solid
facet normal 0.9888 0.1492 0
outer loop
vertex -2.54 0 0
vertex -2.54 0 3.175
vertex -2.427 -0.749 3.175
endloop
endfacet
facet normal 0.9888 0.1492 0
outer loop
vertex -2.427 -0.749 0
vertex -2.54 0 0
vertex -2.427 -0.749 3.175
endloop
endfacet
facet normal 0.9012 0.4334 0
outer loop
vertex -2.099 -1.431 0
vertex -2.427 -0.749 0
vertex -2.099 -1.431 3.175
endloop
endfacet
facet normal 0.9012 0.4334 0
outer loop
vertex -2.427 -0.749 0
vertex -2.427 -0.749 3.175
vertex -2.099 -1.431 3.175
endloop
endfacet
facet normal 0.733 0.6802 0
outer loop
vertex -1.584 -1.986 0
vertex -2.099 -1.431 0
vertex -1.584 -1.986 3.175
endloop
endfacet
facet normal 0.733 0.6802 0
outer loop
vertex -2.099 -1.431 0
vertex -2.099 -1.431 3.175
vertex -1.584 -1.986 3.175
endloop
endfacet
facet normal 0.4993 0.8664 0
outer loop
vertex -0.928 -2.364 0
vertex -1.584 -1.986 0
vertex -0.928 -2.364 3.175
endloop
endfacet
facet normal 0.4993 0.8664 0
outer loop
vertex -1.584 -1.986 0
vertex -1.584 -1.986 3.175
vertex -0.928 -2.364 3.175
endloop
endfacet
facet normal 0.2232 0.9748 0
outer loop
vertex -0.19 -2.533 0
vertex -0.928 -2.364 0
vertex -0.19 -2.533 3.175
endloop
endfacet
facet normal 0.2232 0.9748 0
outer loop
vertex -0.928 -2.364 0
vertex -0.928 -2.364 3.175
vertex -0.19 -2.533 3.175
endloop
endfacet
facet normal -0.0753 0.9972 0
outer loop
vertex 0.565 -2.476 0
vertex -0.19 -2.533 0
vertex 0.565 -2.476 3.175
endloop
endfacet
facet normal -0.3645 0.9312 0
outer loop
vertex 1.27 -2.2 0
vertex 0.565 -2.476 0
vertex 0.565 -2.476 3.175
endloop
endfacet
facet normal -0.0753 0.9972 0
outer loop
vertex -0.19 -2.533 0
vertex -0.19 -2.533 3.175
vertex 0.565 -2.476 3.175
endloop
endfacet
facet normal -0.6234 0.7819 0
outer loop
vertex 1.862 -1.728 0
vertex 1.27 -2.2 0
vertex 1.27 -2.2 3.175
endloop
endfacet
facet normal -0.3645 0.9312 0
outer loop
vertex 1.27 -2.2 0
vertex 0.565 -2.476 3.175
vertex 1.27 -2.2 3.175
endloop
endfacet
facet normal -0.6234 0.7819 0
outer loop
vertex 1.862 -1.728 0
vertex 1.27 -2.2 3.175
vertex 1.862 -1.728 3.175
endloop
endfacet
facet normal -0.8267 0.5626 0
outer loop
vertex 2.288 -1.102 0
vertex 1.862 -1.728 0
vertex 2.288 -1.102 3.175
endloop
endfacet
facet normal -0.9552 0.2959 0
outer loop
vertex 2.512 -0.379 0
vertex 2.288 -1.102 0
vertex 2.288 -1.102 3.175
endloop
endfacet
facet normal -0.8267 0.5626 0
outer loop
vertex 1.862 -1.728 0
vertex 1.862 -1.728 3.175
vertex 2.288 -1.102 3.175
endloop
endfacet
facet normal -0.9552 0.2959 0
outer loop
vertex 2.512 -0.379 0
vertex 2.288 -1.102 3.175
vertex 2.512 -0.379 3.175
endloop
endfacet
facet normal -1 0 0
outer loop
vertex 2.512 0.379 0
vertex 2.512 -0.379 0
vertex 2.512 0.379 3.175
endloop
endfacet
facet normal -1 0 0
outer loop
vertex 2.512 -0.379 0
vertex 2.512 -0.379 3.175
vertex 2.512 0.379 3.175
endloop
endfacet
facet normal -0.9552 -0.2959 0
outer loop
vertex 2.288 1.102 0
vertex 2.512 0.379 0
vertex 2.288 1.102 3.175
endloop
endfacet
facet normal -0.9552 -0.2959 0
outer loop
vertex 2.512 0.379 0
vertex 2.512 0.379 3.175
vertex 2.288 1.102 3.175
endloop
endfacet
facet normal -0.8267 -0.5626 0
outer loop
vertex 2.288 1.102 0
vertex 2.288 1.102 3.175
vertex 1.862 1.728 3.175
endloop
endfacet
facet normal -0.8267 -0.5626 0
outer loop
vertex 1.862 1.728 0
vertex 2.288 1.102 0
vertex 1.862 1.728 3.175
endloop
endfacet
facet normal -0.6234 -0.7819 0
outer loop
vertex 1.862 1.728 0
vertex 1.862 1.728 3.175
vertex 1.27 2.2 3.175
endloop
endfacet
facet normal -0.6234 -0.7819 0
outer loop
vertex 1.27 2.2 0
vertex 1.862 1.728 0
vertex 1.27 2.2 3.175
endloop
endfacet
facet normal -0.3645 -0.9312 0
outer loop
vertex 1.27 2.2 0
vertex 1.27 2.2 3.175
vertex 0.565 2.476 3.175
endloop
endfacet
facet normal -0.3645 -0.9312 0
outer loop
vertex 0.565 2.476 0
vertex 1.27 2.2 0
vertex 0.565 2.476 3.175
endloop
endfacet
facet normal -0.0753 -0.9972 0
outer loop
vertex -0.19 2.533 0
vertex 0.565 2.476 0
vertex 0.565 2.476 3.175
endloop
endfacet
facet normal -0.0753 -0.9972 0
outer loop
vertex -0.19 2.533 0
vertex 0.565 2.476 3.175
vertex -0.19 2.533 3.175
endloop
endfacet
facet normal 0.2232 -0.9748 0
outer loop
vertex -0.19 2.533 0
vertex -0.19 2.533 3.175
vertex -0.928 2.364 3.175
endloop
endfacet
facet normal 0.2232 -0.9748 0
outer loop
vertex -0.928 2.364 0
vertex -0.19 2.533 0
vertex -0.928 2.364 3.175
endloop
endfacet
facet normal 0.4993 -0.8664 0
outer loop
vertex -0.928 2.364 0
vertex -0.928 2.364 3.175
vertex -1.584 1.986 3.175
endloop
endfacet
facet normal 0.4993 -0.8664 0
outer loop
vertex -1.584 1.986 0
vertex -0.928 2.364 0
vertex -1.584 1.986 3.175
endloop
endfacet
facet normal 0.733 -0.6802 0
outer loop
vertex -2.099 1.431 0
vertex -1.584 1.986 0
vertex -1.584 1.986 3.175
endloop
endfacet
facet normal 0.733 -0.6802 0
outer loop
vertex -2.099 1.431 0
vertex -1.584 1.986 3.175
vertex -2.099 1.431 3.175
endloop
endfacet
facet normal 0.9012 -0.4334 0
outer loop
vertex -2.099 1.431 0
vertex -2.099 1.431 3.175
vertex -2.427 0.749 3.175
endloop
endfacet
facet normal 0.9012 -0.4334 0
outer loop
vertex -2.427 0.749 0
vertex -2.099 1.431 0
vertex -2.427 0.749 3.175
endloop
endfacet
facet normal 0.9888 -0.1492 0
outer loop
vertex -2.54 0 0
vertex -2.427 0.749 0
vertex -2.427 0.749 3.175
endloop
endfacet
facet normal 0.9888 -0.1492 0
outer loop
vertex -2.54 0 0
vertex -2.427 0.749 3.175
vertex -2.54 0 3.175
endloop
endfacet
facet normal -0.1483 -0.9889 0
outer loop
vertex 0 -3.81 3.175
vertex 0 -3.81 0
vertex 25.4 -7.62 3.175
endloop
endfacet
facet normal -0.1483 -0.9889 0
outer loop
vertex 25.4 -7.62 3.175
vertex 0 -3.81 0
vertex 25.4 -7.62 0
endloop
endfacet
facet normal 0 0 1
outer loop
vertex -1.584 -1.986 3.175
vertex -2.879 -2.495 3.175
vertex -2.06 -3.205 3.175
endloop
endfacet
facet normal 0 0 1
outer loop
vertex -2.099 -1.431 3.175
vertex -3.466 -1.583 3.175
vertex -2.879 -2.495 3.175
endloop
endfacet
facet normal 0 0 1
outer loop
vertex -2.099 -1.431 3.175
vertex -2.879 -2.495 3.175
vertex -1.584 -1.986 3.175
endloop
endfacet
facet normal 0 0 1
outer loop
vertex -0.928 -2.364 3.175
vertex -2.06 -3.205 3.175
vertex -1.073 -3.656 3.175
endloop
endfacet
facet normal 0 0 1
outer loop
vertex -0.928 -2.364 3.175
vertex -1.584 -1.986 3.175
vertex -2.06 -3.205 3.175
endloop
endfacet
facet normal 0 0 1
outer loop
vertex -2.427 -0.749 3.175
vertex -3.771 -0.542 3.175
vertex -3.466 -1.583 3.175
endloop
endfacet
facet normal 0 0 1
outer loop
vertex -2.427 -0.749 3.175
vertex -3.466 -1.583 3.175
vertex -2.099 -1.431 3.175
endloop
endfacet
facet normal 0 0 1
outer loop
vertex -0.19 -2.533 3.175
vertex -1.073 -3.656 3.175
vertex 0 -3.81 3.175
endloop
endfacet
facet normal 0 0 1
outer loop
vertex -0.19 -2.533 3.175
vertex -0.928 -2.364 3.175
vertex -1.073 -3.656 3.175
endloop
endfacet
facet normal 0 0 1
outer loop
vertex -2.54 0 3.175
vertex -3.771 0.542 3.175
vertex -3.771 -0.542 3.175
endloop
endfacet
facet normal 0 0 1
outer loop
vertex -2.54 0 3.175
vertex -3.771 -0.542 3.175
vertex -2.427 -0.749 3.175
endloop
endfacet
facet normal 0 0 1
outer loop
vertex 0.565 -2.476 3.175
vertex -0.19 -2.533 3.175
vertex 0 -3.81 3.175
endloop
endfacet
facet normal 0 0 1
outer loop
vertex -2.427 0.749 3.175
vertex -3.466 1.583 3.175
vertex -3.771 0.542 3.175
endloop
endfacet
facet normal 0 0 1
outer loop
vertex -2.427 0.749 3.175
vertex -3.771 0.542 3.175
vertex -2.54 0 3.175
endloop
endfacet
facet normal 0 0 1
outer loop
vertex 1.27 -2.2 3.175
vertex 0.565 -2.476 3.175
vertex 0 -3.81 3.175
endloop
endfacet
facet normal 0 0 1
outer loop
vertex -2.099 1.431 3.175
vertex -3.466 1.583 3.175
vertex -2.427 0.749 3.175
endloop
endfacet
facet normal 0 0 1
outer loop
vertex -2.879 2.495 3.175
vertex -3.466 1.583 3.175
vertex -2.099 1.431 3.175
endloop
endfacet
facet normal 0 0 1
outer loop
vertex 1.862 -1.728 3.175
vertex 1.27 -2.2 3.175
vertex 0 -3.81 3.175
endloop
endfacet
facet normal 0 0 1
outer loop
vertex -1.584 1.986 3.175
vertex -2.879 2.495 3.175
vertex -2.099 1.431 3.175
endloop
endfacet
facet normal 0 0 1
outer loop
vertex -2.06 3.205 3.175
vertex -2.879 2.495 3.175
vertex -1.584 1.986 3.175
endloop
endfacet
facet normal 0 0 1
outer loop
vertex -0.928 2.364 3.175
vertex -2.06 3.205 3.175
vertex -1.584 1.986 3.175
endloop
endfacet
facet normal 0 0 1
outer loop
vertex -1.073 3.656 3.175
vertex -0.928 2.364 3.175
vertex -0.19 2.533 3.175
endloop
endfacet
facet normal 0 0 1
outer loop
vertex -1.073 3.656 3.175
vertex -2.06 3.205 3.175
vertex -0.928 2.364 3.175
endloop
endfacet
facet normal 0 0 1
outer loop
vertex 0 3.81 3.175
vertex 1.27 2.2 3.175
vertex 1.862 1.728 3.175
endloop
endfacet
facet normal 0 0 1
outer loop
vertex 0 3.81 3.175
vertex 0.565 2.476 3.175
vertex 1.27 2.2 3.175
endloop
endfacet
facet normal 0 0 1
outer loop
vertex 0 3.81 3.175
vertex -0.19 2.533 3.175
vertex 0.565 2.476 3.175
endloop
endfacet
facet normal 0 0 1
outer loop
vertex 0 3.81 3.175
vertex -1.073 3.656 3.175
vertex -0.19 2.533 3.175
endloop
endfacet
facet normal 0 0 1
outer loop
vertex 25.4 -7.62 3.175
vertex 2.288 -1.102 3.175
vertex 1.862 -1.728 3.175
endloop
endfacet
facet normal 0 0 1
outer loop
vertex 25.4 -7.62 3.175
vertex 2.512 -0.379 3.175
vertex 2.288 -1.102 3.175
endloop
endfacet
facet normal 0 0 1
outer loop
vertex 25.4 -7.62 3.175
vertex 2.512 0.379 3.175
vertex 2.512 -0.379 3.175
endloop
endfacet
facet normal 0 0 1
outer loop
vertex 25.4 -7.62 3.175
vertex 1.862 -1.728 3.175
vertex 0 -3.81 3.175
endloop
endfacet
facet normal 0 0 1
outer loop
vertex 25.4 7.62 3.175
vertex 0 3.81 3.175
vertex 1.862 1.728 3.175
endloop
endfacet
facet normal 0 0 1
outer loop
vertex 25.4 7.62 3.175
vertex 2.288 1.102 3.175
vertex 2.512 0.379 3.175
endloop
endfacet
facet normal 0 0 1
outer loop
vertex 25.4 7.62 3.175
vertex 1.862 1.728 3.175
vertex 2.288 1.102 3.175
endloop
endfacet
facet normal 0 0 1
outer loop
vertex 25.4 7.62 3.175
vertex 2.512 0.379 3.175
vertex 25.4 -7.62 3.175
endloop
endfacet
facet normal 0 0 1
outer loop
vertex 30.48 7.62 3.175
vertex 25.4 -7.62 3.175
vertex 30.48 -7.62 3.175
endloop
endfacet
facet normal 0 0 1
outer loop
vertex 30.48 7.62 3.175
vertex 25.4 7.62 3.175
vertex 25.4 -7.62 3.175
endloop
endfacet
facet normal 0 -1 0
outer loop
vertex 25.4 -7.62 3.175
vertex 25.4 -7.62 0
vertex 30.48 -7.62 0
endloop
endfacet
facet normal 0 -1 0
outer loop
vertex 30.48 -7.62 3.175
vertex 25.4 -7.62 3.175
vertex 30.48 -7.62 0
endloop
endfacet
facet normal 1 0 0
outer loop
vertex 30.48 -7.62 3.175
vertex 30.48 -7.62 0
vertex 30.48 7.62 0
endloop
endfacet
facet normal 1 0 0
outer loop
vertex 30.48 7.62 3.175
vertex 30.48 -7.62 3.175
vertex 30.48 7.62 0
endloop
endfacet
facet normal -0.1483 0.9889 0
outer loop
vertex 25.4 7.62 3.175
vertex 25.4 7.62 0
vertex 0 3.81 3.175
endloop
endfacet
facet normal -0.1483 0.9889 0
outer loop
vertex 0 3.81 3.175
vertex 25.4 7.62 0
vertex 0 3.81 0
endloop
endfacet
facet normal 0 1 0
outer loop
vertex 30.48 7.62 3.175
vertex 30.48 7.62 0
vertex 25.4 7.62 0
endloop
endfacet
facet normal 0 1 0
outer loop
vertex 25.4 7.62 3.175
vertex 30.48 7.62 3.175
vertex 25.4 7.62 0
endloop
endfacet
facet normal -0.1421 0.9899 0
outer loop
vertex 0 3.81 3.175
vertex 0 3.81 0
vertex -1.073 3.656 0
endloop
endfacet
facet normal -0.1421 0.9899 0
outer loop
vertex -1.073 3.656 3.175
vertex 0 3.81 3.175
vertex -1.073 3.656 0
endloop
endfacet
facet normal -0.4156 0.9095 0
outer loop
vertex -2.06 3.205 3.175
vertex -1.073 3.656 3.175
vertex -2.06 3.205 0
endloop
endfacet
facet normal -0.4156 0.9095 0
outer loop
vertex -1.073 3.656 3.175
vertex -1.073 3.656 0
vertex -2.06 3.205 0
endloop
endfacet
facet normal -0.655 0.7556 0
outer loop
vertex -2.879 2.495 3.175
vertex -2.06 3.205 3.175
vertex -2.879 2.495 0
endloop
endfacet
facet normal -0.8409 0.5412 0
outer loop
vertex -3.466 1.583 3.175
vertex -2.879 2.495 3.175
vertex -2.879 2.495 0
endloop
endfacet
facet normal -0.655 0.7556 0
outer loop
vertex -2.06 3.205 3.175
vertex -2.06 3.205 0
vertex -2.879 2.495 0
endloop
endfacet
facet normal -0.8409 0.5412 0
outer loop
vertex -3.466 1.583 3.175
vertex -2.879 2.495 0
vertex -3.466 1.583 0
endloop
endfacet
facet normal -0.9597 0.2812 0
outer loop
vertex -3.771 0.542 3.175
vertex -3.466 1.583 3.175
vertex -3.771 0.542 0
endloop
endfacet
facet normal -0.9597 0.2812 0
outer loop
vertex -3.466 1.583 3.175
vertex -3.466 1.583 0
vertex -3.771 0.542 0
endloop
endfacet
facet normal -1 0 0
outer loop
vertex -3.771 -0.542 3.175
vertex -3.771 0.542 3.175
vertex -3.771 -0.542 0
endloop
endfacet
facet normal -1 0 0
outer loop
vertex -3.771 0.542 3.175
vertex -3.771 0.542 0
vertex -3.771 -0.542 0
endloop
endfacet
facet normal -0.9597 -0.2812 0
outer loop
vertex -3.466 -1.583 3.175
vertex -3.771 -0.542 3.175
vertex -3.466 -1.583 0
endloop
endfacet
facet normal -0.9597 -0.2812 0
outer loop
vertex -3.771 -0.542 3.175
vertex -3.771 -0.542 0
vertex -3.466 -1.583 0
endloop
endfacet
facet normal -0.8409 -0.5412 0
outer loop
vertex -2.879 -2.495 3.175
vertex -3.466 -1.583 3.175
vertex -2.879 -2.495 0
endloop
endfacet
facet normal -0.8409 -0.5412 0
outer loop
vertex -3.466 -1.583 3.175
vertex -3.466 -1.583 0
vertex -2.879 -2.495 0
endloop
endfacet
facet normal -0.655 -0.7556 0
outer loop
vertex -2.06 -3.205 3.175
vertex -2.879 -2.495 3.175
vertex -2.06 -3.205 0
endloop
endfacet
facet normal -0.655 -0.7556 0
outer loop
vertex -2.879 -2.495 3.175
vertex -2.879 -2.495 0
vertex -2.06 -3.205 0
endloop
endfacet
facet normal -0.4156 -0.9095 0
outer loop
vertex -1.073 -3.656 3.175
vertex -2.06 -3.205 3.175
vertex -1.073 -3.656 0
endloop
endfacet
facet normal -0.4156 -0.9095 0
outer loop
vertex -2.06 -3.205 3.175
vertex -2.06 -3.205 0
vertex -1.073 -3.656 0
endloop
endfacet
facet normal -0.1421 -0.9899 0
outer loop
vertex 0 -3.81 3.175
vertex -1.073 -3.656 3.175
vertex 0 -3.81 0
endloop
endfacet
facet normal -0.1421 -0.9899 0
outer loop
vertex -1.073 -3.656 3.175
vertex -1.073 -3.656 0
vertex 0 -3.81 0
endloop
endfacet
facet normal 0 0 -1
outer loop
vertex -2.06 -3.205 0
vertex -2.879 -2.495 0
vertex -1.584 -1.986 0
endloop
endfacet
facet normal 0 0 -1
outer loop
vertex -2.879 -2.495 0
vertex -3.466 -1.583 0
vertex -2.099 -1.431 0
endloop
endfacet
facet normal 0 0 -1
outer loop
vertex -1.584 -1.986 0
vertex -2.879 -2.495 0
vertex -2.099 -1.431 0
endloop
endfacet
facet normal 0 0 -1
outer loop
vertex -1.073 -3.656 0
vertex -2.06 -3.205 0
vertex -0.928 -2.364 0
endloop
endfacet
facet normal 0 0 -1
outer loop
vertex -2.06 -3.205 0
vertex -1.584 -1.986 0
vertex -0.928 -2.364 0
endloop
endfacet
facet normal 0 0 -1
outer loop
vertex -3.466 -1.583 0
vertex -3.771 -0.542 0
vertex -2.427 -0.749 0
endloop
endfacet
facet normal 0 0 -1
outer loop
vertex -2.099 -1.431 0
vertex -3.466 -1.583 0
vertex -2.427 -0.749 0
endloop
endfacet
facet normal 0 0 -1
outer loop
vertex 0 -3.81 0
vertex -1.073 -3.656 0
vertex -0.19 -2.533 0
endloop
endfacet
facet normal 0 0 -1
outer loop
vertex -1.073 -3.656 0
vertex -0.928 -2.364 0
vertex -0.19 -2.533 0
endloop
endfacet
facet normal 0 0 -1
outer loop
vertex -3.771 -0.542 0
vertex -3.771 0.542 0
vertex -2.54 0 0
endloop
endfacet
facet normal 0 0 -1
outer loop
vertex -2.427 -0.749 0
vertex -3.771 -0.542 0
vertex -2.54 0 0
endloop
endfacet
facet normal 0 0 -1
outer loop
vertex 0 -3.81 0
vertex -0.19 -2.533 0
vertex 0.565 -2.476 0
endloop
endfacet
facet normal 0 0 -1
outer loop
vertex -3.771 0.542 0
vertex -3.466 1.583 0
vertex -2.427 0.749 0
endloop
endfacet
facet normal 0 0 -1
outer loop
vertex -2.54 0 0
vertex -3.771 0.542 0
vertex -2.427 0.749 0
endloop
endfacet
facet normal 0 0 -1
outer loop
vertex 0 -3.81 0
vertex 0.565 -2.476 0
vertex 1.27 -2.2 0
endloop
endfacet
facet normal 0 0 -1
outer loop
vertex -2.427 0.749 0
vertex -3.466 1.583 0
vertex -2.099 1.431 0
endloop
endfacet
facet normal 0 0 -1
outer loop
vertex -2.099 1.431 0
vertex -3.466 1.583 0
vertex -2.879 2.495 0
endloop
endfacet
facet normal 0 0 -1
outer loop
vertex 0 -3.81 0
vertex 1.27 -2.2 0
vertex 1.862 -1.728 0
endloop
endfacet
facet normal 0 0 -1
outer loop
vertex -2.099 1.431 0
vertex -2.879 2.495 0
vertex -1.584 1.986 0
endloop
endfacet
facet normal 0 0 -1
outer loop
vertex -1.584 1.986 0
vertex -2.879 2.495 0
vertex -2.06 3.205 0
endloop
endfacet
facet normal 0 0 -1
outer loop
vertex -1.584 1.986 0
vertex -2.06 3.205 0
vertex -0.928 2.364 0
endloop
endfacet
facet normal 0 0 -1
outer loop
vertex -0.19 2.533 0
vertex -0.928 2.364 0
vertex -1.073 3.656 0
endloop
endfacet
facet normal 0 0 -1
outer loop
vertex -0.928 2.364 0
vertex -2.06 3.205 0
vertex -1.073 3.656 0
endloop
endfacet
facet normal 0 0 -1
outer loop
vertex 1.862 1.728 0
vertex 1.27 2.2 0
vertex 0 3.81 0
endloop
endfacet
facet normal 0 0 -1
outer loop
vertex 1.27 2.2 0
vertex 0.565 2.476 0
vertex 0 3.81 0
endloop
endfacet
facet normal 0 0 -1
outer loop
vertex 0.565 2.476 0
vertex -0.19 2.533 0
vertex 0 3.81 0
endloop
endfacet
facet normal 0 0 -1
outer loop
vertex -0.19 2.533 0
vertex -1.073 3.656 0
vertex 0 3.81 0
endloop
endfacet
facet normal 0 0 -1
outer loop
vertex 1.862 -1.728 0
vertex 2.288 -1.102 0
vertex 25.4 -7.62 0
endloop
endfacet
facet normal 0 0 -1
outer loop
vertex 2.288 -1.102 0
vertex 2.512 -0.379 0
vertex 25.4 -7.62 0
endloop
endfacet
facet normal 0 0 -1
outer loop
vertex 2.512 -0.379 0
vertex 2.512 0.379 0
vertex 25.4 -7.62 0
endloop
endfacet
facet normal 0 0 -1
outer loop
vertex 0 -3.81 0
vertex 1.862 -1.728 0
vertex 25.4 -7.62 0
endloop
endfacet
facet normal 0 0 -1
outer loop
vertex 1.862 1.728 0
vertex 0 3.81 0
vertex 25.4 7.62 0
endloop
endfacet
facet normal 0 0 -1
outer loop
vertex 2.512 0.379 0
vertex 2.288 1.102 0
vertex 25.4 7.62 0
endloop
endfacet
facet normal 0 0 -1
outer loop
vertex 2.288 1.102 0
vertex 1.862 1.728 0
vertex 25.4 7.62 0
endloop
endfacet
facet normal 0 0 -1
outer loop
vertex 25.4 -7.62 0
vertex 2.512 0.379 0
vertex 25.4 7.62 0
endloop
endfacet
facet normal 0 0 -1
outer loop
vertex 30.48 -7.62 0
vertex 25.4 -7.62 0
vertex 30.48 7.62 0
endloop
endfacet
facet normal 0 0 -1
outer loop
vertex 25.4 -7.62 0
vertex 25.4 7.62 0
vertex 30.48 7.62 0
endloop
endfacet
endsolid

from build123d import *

# Parameters (mm, degrees)
F1_DEPTH = 3.175
F3_D     = 5.08


with BuildPart() as f1:
    # F0 (on Top) → F1 (new body)
    with BuildSketch(Plane.XY):
        with BuildLine():
            Line((25.4, 7.62), (0, 3.81))
            ThreePointArc((0, 3.81), (-3.81, 0), (0, -3.81))
            Line((0, -3.81), (25.4, -7.62))
            Line((25.4, -7.62), (30.48, -7.62))
            Line((30.48, -7.62), (30.48, 7.62))
            Line((30.48, 7.62), (25.4, 7.62))
        make_face()
    extrude(amount=F1_DEPTH)

    # F3 (through all)
    with Locations(Plane(origin=(0, 0, 0), x_dir=(1, 0, 0), z_dir=(0, 0, -1))):
        with Locations((0, 0)):
            Hole(F3_D / 2)


solid = f1.part
